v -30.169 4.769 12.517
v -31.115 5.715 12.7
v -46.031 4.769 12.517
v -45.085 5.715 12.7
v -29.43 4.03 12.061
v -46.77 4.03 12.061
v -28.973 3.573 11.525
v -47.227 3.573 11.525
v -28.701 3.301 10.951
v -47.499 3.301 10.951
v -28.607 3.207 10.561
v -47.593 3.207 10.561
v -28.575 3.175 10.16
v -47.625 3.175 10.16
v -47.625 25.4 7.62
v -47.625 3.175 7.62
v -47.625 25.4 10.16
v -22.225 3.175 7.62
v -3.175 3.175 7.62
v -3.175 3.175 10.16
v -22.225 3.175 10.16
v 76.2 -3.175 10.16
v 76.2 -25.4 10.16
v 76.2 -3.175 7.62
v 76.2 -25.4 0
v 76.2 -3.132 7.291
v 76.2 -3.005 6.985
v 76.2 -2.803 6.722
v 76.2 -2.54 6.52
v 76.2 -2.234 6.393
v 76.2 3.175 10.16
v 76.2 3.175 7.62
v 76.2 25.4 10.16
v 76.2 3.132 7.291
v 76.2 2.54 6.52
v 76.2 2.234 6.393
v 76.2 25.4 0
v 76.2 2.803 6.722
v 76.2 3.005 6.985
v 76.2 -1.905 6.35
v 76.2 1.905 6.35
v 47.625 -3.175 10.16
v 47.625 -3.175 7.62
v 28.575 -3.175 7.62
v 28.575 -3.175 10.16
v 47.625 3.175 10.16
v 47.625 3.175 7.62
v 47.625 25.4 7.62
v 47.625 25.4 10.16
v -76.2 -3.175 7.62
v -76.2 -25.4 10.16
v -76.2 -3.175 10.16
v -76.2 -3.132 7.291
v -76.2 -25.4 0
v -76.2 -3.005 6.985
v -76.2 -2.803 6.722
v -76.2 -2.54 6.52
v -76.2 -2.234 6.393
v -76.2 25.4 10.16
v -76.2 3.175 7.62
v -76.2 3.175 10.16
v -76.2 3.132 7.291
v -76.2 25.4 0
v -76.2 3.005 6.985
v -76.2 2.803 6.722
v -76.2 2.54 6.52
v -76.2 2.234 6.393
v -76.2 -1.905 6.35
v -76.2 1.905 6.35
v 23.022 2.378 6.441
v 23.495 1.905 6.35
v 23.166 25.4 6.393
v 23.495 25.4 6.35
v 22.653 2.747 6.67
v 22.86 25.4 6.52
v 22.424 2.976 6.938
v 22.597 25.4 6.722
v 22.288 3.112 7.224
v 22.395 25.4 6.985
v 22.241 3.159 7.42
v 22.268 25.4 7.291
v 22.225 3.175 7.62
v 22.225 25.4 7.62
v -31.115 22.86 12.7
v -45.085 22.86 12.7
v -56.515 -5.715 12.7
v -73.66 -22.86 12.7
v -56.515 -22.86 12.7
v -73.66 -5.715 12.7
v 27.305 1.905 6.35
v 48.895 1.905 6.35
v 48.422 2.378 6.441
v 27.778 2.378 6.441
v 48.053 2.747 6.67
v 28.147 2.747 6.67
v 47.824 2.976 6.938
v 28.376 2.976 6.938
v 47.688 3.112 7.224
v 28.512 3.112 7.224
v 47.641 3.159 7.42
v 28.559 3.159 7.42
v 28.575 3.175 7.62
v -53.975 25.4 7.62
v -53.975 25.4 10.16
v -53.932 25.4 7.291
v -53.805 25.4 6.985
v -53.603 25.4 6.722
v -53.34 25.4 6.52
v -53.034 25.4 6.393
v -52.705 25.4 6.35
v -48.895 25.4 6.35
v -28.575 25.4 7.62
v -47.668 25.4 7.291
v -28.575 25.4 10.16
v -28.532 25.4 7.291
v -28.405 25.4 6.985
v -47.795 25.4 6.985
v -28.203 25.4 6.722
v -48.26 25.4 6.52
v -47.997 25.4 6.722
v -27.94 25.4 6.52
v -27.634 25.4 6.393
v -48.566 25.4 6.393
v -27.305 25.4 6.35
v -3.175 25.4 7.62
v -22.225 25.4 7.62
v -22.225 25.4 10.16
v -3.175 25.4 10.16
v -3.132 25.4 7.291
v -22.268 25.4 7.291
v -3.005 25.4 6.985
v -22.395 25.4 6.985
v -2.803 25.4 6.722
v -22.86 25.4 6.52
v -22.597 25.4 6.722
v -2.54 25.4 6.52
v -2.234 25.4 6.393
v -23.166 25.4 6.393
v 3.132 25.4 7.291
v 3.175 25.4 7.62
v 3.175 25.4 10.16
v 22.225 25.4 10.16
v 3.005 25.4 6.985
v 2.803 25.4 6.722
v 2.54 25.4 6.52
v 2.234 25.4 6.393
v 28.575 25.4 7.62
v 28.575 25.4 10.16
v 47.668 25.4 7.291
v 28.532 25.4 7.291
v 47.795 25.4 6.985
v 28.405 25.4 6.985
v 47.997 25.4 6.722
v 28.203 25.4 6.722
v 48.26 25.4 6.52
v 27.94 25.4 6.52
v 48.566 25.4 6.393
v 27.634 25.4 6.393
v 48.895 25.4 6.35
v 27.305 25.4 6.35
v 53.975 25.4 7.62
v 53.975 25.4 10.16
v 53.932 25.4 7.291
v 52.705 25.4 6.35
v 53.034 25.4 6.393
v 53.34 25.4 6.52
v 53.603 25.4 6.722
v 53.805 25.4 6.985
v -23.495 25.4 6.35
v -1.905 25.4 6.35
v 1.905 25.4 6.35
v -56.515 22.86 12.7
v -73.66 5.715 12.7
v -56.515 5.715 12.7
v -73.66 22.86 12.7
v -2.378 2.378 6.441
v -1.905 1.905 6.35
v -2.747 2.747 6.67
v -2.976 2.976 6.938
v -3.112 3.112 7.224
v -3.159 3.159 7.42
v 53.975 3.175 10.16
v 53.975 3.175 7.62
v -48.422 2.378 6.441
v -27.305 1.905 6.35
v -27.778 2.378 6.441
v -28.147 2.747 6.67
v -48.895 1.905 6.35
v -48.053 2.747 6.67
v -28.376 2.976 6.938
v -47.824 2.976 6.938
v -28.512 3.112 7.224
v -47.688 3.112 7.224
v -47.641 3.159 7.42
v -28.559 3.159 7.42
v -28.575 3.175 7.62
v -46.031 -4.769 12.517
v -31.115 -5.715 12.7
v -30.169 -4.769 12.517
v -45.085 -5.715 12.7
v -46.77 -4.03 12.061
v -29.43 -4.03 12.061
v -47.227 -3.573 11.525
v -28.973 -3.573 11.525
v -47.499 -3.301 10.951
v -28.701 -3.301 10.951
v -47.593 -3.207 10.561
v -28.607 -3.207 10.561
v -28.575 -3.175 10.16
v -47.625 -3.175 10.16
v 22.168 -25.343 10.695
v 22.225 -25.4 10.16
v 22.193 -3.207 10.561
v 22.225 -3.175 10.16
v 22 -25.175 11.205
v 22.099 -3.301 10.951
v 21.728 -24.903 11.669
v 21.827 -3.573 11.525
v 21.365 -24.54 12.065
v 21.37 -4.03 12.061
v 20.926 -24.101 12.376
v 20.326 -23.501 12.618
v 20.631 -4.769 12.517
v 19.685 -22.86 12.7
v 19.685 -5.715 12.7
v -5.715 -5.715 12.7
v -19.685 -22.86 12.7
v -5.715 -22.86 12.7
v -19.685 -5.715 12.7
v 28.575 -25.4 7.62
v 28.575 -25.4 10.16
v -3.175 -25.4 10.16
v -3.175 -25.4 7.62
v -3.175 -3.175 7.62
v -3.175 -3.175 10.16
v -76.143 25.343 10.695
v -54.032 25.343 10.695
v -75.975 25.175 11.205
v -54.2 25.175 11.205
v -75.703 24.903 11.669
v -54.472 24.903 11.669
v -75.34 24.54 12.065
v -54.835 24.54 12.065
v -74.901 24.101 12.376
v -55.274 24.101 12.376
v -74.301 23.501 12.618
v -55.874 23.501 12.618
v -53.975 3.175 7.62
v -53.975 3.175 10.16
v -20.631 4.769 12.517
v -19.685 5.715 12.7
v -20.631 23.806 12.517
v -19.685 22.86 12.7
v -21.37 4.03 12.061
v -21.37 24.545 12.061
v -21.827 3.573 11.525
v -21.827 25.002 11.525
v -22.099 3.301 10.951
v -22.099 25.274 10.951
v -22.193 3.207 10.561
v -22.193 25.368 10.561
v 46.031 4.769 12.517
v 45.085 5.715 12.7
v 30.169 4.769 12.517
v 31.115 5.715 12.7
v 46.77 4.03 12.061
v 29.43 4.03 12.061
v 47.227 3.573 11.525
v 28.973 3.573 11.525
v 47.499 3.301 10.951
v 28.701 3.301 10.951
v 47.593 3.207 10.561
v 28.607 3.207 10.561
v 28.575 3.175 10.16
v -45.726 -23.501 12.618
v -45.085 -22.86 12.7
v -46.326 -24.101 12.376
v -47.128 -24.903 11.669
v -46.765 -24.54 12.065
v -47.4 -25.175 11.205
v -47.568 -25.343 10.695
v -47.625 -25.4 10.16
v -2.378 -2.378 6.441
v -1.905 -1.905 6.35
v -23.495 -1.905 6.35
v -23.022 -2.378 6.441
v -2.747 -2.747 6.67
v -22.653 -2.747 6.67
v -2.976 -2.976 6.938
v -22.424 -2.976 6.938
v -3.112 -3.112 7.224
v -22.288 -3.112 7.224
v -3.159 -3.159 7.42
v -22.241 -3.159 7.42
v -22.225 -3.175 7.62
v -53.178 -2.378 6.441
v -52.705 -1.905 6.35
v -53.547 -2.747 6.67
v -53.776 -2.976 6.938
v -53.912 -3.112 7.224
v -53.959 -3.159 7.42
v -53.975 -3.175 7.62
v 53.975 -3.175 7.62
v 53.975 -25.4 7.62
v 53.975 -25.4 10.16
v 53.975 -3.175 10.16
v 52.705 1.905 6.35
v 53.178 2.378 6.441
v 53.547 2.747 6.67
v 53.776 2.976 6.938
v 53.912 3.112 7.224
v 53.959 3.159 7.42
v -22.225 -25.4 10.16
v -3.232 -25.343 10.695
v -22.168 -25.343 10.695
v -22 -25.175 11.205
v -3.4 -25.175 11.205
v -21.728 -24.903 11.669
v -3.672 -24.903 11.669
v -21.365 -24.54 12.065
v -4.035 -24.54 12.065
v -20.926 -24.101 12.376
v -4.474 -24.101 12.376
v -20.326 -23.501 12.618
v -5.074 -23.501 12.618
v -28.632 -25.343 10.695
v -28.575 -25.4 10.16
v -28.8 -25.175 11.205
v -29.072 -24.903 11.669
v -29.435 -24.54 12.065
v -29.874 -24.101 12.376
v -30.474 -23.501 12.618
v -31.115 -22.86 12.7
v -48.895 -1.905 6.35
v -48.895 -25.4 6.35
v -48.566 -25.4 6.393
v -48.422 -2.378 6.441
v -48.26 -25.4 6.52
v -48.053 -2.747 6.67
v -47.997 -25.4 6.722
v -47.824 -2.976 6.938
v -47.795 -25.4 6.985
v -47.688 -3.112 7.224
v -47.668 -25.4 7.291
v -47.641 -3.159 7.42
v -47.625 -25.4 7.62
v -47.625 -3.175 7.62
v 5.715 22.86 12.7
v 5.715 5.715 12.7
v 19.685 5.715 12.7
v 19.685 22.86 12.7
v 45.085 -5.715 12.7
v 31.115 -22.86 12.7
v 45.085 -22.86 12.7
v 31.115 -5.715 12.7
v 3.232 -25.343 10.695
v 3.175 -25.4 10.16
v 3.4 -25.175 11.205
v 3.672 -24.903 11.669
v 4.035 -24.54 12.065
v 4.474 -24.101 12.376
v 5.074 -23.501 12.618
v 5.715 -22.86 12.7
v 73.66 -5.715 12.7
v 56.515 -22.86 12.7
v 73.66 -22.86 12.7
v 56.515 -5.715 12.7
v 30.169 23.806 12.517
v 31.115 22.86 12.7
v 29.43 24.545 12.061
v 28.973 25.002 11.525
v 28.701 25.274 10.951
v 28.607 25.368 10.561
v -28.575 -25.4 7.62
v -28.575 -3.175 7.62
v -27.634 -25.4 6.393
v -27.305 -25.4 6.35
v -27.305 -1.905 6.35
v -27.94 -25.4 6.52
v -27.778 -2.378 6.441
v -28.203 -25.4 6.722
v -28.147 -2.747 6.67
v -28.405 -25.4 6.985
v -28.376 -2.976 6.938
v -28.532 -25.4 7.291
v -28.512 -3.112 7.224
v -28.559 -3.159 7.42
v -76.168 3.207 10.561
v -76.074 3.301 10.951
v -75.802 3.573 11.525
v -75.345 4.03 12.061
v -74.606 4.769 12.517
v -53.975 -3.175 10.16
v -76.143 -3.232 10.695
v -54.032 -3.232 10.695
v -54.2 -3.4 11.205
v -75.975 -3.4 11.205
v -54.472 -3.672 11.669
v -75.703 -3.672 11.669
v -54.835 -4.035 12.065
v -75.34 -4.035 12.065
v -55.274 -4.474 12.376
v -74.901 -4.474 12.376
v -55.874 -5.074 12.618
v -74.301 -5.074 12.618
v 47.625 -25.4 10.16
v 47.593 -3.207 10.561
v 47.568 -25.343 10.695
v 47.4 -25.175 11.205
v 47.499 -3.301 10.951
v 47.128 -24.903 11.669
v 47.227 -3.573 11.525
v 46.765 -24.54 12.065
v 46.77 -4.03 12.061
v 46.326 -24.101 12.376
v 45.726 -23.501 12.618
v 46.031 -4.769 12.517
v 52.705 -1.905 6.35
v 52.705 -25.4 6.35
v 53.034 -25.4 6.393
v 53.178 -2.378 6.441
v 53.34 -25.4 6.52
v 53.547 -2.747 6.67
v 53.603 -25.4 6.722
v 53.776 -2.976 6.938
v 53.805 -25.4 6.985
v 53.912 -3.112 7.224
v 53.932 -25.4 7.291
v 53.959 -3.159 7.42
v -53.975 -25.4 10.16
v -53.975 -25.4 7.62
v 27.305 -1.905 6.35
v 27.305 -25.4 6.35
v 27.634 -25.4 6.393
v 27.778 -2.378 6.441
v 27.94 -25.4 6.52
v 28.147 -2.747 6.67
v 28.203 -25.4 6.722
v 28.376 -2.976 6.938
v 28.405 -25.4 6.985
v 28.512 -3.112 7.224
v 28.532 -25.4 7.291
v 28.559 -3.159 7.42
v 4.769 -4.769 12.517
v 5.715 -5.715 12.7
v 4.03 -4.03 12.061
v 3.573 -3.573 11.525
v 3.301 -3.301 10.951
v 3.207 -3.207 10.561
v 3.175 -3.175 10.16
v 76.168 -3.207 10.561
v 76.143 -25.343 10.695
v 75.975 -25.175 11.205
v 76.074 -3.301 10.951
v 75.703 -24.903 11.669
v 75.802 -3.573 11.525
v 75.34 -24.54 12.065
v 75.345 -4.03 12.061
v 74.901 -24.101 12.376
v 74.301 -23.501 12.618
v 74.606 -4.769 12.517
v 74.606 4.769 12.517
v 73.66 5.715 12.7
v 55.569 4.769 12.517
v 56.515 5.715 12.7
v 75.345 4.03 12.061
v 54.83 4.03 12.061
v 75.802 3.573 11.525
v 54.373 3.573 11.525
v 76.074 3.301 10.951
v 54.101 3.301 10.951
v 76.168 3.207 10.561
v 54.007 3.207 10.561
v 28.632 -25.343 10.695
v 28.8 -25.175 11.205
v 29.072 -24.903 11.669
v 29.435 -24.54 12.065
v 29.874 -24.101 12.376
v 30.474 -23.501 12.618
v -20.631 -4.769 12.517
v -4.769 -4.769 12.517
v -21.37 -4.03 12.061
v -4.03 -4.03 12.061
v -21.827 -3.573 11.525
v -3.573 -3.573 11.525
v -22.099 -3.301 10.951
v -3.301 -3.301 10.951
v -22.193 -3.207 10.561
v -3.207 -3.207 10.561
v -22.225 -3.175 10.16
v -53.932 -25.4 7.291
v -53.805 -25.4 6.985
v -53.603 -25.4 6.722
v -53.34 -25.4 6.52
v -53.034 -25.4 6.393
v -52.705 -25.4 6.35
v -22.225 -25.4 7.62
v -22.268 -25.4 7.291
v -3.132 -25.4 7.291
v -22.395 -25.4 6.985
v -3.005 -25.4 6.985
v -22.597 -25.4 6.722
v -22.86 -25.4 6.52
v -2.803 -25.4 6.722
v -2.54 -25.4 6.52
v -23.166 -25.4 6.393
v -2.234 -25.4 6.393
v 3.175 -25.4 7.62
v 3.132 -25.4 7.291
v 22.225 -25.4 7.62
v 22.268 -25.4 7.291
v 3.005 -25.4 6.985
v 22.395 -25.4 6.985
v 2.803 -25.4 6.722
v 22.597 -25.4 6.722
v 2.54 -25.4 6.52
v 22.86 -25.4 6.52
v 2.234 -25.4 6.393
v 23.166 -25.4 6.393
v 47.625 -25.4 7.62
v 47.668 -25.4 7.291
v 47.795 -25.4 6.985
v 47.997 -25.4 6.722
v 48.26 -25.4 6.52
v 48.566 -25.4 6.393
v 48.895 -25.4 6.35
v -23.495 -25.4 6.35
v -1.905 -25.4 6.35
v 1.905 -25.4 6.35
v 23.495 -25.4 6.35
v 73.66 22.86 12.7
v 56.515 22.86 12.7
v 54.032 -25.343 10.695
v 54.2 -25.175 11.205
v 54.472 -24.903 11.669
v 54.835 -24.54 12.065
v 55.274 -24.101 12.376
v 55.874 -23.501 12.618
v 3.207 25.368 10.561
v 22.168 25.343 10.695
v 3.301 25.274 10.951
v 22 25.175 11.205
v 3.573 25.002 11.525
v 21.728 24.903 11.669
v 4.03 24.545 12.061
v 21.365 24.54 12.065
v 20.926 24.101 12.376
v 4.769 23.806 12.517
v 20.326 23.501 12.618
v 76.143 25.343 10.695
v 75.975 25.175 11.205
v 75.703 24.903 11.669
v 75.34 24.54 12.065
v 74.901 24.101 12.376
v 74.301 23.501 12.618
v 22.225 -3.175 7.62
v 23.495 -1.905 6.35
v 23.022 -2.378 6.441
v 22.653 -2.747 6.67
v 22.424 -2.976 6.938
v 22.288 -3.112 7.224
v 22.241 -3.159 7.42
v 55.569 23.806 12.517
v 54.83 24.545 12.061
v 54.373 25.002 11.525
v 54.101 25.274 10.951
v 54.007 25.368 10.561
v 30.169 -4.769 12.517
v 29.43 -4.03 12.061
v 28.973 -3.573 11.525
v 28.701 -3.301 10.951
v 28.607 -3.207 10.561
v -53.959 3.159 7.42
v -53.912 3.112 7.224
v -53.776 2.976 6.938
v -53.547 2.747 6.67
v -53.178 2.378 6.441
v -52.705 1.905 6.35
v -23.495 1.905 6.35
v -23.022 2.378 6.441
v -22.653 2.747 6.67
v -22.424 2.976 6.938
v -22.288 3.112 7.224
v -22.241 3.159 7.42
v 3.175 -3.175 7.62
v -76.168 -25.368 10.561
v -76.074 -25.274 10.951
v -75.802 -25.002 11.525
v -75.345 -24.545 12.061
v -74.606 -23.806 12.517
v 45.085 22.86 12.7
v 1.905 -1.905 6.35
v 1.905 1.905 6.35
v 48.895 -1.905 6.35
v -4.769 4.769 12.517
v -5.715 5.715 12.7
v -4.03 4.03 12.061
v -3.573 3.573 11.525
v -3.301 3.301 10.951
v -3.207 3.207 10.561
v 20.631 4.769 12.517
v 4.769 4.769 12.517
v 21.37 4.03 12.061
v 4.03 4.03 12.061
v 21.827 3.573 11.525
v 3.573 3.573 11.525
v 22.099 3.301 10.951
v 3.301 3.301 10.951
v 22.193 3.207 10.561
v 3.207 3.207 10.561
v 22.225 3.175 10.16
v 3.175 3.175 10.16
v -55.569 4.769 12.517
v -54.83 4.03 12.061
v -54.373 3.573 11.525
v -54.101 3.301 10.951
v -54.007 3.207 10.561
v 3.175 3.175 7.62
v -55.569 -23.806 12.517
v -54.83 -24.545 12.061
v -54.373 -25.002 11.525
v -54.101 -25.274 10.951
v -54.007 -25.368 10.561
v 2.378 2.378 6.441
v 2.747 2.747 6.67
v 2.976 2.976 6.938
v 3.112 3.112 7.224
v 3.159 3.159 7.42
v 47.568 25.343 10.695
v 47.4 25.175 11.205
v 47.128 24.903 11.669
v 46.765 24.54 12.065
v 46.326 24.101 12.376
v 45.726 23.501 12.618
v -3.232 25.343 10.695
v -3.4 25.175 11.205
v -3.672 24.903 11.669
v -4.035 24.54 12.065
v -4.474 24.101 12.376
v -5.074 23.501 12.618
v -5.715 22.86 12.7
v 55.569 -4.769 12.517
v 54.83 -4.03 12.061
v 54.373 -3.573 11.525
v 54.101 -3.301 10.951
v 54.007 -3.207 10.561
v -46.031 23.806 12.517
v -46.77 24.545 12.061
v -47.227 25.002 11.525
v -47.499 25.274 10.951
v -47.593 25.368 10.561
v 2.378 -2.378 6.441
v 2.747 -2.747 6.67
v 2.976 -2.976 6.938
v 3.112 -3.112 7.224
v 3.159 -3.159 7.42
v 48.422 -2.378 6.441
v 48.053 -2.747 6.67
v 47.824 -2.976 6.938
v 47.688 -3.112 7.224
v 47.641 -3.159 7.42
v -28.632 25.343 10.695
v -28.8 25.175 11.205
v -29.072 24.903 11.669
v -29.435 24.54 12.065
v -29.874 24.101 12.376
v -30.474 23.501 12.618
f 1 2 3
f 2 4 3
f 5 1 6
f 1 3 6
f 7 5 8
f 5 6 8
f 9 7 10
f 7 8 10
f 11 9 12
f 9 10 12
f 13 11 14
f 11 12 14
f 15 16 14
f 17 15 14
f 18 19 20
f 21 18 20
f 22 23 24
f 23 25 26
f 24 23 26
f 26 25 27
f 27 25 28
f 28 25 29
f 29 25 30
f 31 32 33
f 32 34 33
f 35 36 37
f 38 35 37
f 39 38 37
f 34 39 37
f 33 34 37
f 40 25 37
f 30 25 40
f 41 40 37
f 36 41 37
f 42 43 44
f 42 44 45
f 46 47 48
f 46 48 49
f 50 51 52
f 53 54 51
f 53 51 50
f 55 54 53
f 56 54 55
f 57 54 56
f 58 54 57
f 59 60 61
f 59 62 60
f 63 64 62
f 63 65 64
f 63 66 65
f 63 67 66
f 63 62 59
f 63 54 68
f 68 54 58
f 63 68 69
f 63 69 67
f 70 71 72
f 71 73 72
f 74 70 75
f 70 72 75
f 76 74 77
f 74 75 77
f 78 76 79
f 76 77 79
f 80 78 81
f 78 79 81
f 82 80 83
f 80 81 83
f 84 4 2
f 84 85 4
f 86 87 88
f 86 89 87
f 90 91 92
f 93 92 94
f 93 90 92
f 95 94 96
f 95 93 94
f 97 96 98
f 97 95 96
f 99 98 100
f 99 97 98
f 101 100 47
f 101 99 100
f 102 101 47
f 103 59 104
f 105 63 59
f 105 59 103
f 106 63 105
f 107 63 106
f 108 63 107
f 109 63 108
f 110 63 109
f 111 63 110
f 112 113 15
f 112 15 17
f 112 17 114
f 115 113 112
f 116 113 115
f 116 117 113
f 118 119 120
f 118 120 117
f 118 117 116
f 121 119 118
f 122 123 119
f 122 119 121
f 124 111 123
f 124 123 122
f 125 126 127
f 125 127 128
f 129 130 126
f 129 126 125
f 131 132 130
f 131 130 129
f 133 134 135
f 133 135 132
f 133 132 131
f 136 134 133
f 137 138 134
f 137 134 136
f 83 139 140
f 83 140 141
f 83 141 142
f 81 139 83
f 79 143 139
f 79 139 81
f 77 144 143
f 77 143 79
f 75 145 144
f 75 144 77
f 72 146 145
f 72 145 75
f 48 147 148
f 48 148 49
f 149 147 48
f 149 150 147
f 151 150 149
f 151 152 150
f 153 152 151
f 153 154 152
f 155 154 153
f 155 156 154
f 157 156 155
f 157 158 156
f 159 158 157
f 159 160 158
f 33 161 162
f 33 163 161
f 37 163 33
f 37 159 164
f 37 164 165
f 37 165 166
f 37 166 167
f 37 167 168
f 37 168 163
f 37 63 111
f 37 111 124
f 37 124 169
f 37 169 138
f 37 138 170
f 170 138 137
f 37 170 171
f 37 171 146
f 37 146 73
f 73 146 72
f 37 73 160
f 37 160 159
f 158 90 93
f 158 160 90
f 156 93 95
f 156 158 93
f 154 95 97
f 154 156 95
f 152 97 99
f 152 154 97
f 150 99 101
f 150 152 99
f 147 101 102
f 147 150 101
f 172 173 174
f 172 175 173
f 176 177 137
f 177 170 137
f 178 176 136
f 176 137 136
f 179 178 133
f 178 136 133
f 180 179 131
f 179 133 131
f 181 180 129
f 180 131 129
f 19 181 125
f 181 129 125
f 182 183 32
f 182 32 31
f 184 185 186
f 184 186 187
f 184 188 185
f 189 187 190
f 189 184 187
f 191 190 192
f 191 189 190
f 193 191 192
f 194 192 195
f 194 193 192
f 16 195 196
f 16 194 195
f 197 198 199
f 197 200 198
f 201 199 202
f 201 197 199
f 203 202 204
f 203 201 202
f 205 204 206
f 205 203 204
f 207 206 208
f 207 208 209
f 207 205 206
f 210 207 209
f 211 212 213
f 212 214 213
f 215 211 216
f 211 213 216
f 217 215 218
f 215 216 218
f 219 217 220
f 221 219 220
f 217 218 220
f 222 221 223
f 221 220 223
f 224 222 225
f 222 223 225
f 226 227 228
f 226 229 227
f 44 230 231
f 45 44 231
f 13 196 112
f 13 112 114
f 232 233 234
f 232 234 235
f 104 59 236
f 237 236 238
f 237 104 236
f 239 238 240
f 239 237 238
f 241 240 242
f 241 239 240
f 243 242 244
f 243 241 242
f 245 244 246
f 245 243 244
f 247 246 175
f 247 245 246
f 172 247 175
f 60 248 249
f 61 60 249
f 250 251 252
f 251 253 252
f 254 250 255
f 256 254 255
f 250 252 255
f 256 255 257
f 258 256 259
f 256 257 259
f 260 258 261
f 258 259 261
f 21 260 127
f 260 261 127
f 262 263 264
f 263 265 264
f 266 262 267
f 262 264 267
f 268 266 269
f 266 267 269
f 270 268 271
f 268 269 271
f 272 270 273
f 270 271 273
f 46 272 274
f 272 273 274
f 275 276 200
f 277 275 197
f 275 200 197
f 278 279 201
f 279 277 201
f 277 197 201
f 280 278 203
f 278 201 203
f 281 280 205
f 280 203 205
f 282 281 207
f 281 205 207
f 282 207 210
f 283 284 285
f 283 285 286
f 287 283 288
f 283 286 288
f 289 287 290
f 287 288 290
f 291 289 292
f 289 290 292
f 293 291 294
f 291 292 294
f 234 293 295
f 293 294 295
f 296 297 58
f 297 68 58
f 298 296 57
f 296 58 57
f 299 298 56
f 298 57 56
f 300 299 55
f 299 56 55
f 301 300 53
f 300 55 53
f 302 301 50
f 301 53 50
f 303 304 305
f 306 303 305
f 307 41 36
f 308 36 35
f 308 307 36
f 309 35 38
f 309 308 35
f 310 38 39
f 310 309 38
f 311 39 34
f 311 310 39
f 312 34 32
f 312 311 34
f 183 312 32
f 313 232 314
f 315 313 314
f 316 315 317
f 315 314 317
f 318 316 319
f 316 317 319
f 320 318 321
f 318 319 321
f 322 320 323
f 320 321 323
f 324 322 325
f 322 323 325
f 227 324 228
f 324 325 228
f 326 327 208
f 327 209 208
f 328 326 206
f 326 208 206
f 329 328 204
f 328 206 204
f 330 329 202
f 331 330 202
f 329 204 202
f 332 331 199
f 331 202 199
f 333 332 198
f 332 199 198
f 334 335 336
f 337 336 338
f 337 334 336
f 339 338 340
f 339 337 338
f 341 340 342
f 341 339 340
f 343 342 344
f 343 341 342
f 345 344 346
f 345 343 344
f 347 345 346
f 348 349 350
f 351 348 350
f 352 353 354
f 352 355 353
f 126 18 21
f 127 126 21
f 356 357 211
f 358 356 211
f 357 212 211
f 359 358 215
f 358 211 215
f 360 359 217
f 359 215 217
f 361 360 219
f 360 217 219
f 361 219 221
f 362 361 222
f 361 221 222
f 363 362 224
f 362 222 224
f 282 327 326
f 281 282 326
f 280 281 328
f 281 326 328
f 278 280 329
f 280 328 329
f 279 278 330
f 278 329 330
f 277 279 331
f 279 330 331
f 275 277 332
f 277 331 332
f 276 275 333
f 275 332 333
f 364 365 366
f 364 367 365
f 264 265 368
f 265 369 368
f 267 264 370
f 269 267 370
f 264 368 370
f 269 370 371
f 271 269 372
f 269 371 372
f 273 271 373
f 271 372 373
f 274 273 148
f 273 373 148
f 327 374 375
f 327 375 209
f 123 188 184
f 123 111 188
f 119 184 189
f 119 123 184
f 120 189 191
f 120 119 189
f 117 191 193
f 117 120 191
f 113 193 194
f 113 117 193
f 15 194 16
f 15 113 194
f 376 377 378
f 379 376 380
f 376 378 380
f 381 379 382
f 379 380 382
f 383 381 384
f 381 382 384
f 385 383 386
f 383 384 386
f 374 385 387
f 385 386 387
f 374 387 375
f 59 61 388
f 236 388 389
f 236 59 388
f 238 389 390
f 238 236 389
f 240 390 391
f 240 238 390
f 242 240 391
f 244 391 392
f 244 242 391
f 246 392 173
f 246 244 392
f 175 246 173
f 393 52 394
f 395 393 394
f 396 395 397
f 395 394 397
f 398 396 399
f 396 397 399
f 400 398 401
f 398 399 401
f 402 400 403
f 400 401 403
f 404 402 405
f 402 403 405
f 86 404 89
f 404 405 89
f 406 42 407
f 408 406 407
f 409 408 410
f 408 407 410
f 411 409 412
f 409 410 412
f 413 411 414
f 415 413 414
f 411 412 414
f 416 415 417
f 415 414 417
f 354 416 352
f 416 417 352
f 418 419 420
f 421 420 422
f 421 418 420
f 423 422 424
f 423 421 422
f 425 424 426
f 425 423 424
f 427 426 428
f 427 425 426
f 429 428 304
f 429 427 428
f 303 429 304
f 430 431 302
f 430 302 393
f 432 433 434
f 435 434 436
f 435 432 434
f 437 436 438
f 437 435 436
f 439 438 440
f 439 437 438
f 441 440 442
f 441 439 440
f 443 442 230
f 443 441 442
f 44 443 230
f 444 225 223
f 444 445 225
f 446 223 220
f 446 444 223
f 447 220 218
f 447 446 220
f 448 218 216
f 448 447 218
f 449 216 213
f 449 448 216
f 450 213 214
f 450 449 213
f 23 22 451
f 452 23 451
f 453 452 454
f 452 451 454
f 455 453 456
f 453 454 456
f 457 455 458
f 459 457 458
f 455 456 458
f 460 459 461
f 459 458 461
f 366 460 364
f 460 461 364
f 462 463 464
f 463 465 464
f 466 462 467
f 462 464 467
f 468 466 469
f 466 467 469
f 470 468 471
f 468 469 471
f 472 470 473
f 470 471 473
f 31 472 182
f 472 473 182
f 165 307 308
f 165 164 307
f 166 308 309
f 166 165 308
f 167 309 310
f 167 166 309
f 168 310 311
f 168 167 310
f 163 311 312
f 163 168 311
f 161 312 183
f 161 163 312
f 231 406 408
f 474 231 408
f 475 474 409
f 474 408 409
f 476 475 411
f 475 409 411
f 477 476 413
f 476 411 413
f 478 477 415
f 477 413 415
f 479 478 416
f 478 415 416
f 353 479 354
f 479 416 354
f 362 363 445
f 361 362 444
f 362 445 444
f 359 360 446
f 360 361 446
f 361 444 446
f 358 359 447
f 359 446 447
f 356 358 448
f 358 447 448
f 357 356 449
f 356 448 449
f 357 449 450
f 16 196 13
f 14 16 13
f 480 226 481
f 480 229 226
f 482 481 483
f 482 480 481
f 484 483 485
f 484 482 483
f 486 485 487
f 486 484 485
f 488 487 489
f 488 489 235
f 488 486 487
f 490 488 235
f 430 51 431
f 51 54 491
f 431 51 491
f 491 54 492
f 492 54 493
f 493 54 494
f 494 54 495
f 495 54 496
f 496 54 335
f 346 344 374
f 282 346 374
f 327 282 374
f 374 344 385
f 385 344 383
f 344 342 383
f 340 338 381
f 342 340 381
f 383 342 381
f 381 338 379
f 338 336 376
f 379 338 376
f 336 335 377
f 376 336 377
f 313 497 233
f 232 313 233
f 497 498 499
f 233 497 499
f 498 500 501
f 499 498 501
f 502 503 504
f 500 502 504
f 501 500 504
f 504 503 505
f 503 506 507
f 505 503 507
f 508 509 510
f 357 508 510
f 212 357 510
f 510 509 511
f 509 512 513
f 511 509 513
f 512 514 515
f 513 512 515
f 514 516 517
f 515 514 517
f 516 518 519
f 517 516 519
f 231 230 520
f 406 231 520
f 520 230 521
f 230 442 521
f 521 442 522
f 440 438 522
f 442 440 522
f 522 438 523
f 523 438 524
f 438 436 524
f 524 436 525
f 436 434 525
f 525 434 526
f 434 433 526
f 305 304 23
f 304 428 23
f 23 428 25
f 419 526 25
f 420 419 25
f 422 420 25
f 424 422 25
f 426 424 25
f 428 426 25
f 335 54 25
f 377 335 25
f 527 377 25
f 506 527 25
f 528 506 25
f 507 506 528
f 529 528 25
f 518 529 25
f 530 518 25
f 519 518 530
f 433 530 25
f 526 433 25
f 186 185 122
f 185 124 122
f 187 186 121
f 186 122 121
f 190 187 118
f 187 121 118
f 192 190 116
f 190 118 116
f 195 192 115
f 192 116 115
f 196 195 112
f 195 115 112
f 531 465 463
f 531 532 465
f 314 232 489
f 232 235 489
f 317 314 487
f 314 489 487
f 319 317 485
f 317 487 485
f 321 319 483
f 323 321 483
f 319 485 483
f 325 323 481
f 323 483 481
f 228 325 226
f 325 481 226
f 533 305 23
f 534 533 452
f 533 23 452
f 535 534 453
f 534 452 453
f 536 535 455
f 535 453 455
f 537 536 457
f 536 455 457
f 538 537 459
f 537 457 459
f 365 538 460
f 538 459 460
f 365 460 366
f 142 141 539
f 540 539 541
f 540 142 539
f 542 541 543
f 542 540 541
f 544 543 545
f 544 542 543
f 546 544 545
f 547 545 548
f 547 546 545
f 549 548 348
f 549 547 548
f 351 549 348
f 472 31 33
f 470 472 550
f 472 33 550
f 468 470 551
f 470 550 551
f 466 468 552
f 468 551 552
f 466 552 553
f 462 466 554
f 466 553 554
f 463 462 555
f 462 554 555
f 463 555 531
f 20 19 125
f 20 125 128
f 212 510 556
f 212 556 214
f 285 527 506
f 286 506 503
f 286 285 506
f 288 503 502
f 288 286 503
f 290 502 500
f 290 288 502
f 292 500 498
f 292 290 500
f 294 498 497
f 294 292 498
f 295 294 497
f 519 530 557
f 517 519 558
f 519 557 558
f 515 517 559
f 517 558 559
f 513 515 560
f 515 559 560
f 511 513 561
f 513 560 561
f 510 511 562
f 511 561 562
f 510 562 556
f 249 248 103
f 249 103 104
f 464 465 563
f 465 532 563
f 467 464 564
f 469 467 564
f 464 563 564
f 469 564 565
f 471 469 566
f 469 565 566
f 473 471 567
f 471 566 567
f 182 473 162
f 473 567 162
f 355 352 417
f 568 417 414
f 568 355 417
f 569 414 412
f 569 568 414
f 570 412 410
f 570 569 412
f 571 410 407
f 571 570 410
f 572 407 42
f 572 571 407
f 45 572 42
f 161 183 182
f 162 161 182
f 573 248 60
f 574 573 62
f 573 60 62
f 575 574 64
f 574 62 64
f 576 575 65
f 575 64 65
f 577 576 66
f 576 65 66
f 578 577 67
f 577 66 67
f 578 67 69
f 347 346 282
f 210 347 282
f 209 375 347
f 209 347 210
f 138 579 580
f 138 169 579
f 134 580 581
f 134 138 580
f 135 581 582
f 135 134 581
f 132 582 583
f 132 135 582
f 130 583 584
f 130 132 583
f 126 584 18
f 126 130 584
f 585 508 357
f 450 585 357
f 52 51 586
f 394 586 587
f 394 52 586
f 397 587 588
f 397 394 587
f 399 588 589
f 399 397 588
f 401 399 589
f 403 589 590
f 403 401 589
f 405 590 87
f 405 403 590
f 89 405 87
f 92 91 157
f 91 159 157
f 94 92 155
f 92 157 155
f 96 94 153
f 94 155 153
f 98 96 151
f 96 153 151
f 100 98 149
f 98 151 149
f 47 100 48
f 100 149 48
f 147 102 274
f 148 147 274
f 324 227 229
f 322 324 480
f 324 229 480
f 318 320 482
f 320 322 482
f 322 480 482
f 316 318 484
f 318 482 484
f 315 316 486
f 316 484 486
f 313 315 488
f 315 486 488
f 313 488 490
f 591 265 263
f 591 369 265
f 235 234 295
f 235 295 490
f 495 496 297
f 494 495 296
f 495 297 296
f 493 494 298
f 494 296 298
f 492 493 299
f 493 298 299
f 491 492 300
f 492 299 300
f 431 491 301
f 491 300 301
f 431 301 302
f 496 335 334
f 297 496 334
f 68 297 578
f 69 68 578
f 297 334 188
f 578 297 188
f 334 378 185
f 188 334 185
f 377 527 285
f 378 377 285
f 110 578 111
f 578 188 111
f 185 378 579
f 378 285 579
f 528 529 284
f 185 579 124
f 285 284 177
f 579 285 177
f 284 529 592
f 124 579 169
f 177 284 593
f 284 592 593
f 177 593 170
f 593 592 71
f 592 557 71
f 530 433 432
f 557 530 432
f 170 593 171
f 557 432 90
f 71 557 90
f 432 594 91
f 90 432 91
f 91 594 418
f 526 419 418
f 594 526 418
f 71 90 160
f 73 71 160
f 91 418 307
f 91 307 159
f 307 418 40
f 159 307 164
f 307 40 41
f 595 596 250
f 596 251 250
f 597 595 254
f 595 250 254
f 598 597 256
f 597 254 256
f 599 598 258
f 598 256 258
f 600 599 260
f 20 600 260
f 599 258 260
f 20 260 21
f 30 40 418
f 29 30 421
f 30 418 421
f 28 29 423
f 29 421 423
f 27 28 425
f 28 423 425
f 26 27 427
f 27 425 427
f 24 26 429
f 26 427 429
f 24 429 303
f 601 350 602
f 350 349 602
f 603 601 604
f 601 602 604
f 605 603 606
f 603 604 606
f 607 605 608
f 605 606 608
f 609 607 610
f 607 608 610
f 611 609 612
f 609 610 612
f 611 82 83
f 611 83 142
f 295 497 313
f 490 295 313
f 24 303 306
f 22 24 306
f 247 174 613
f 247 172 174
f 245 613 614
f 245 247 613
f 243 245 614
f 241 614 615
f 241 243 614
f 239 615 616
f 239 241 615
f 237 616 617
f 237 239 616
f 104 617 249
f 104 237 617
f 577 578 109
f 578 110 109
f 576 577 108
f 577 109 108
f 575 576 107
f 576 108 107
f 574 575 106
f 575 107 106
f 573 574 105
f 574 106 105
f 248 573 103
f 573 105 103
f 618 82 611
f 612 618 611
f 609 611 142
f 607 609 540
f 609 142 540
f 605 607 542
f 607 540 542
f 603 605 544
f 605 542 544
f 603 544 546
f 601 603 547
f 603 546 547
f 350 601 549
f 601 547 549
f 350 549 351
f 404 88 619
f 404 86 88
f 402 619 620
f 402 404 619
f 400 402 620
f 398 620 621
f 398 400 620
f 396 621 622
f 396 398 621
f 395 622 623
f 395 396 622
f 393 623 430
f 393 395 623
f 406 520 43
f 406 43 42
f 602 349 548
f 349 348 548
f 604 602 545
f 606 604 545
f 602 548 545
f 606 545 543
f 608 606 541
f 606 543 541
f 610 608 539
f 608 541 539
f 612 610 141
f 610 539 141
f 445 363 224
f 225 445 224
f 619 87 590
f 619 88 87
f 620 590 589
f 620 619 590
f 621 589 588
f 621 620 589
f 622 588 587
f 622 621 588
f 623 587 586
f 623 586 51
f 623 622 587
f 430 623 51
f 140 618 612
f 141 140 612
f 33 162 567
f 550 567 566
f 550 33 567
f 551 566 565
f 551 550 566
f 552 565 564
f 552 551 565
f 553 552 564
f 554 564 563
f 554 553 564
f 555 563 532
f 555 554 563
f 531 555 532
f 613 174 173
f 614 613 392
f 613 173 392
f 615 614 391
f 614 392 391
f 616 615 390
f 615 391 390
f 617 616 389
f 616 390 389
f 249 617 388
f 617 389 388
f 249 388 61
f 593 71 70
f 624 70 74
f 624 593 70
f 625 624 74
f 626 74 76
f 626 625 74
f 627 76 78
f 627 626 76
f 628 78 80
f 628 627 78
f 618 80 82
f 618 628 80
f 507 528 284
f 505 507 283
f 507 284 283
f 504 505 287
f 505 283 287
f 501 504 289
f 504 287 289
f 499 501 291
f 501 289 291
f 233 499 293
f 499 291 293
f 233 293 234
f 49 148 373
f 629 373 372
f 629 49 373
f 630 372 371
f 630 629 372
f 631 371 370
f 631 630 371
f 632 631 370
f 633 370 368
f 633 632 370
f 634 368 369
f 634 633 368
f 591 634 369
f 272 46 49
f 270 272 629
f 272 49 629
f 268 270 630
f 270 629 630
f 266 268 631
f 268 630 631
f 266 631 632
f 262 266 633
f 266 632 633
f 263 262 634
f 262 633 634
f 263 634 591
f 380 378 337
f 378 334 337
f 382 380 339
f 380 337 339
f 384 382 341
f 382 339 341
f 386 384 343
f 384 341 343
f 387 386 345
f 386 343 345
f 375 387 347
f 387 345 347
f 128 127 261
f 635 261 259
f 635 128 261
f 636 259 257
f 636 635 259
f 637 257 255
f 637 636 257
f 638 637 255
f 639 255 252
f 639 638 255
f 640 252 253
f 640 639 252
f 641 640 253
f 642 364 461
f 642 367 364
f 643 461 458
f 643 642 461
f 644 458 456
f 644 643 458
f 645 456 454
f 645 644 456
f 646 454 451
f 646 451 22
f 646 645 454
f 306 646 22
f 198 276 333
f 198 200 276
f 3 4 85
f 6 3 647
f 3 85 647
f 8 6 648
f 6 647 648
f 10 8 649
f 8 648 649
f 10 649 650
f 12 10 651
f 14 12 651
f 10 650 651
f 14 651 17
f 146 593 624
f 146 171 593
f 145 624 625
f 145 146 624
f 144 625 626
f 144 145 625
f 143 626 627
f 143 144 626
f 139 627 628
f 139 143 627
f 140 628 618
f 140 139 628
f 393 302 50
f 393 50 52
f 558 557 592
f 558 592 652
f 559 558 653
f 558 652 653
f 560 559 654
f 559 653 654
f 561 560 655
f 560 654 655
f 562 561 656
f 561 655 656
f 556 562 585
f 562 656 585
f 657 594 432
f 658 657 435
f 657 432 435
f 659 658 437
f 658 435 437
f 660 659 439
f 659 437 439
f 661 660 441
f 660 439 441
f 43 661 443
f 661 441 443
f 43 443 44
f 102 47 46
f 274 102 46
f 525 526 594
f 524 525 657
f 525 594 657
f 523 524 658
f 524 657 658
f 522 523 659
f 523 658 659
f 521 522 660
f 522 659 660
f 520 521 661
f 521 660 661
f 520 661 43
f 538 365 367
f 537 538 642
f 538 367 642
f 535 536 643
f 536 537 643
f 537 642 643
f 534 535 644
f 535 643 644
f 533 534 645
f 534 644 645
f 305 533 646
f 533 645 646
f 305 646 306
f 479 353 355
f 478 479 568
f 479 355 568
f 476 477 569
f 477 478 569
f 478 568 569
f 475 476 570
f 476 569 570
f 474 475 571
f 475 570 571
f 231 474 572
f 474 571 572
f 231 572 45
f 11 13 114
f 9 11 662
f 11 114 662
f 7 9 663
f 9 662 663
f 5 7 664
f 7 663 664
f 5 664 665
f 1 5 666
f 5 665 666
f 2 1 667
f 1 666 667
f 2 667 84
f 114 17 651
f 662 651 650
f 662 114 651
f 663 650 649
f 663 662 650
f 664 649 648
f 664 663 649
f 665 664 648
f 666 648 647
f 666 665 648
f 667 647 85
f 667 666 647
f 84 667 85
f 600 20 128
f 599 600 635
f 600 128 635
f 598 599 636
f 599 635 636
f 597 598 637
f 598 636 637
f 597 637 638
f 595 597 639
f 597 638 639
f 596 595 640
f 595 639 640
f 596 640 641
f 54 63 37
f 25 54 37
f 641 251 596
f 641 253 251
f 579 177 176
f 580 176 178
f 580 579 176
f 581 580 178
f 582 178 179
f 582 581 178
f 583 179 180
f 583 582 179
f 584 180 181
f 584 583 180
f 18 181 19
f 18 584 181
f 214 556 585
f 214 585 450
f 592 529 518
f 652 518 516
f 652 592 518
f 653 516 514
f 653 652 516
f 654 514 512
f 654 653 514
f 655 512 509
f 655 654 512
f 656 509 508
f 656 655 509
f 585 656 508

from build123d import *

# Parameters (mm, degrees)
F0_W     = 152.4
F0_H     = 50.8
F1_DEPTH = 12.7
F2_W     = 6.35
F2_H     = 12.7
F3_DEPTH = 152.401
F4_W     = 6.35
F4_H     = 12.7
F5_DEPTH = 50.801
F6_R     = 2.54
F7_R     = 1.27


with BuildPart() as f1:
    # F0 (on Top) → F1 (new body)
    with BuildSketch(Plane.XY):
        Rectangle(F0_W, F0_H)
    extrude(amount=F1_DEPTH)

    # F2 (on face) → F3 (cut, through all)
    with BuildSketch(Plane.YZ.offset(76.2)):
        with Locations((0, 12.7)):
            Rectangle(F2_W, F2_H)
    extrude(amount=-F3_DEPTH, mode=Mode.SUBTRACT)

    # F4 (on face) → F5 (cut, through all)
    with BuildSketch(Plane.XZ.offset(25.4)):
        with Locations((0, 12.7)):
            Rectangle(F4_W, F4_H)
        with Locations((25.4, 12.7)):
            Rectangle(F4_W, F4_H)
        with Locations((50.8, 12.7)):
            Rectangle(F4_W, F4_H)
        with Locations((-25.4, 12.7)):
            Rectangle(F4_W, F4_H)
        with Locations((-50.8, 12.7)):
            Rectangle(F4_W, F4_H)
    extrude(amount=-F5_DEPTH, mode=Mode.SUBTRACT)

    # F6
    f6_edges = [f1.edges().sort_by_distance(p)[0] for p in [
        (-65.0875, -25.4, 12.7),
        (-76.2, -14.2875, 12.7),
        (-65.0875, -3.175, 12.7),
        (-53.975, -14.2875, 12.7),
        (-38.1, -25.4, 12.7),
        (-47.625, -14.2875, 12.7),
        (-38.1, -3.175, 12.7),
        (-28.575, -14.2875, 12.7),
        (-12.7, -25.4, 12.7),
        (-22.225, -14.2875, 12.7),
        (-12.7, -3.175, 12.7),
        (-3.175, -14.2875, 12.7),
        (12.7, -25.4, 12.7),
        (3.175, -14.2875, 12.7),
        (12.7, -3.175, 12.7),
        (22.225, -14.2875, 12.7),
        (38.1, -25.4, 12.7),
        (28.575, -14.2875, 12.7),
        (38.1, -3.175, 12.7),
        (47.625, -14.2875, 12.7),
        (65.0875, -25.4, 12.7),
        (53.975, -14.2875, 12.7),
        (65.0875, -3.175, 12.7),
        (76.2, -14.2875, 12.7),
        (65.0875, 3.175, 12.7),
        (53.975, 14.2875, 12.7),
        (65.0875, 25.4, 12.7),
        (76.2, 14.2875, 12.7),
        (38.1, 3.175, 12.7),
        (28.575, 14.2875, 12.7),
        (38.1, 25.4, 12.7),
        (47.625, 14.2875, 12.7),
        (12.7, 3.175, 12.7),
        (3.175, 14.2875, 12.7),
        (12.7, 25.4, 12.7),
        (22.225, 14.2875, 12.7),
        (-38.1, 3.175, 12.7),
        (-47.625, 14.2875, 12.7),
        (-38.1, 25.4, 12.7),
        (-28.575, 14.2875, 12.7),
        (-12.7, 3.175, 12.7),
        (-22.225, 14.2875, 12.7),
        (-12.7, 25.4, 12.7),
        (-3.175, 14.2875, 12.7),
        (-65.0875, 3.175, 12.7),
        (-76.2, 14.2875, 12.7),
        (-65.0875, 25.4, 12.7),
        (-53.975, 14.2875, 12.7),
    ]]
    fillet(f6_edges, radius=F6_R)

    # F7
    f7_edges = [f1.edges().sort_by_distance(p)[0] for p in [
        (-47.625, 14.2875, 6.35),
        (-53.975, 14.2875, 6.35),
        (-53.975, -14.2875, 6.35),
        (-47.625, -14.2875, 6.35),
        (-22.225, -14.2875, 6.35),
        (-28.575, -14.2875, 6.35),
        (-28.575, 14.2875, 6.35),
        (-22.225, 14.2875, 6.35),
        (3.175, -14.2875, 6.35),
        (3.175, 14.2875, 6.35),
        (-3.175, 14.2875, 6.35),
        (-3.175, -14.2875, 6.35),
        (22.225, 14.2875, 6.35),
        (22.225, -14.2875, 6.35),
        (28.575, -14.2875, 6.35),
        (28.575, 14.2875, 6.35),
        (47.625, 14.2875, 6.35),
        (47.625, -14.2875, 6.35),
        (53.975, 14.2875, 6.35),
        (53.975, -14.2875, 6.35),
        (65.0875, -3.175, 6.35),
        (38.1, -3.175, 6.35),
        (12.7, -3.175, 6.35),
        (-12.7, -3.175, 6.35),
        (-38.1, -3.175, 6.35),
        (-65.0875, -3.175, 6.35),
        (-65.0875, 3.175, 6.35),
        (-12.7, 3.175, 6.35),
        (-38.1, 3.175, 6.35),
        (12.7, 3.175, 6.35),
        (38.1, 3.175, 6.35),
        (65.0875, 3.175, 6.35),
    ]]
    fillet(f7_edges, radius=F7_R)


solid = f1.part
